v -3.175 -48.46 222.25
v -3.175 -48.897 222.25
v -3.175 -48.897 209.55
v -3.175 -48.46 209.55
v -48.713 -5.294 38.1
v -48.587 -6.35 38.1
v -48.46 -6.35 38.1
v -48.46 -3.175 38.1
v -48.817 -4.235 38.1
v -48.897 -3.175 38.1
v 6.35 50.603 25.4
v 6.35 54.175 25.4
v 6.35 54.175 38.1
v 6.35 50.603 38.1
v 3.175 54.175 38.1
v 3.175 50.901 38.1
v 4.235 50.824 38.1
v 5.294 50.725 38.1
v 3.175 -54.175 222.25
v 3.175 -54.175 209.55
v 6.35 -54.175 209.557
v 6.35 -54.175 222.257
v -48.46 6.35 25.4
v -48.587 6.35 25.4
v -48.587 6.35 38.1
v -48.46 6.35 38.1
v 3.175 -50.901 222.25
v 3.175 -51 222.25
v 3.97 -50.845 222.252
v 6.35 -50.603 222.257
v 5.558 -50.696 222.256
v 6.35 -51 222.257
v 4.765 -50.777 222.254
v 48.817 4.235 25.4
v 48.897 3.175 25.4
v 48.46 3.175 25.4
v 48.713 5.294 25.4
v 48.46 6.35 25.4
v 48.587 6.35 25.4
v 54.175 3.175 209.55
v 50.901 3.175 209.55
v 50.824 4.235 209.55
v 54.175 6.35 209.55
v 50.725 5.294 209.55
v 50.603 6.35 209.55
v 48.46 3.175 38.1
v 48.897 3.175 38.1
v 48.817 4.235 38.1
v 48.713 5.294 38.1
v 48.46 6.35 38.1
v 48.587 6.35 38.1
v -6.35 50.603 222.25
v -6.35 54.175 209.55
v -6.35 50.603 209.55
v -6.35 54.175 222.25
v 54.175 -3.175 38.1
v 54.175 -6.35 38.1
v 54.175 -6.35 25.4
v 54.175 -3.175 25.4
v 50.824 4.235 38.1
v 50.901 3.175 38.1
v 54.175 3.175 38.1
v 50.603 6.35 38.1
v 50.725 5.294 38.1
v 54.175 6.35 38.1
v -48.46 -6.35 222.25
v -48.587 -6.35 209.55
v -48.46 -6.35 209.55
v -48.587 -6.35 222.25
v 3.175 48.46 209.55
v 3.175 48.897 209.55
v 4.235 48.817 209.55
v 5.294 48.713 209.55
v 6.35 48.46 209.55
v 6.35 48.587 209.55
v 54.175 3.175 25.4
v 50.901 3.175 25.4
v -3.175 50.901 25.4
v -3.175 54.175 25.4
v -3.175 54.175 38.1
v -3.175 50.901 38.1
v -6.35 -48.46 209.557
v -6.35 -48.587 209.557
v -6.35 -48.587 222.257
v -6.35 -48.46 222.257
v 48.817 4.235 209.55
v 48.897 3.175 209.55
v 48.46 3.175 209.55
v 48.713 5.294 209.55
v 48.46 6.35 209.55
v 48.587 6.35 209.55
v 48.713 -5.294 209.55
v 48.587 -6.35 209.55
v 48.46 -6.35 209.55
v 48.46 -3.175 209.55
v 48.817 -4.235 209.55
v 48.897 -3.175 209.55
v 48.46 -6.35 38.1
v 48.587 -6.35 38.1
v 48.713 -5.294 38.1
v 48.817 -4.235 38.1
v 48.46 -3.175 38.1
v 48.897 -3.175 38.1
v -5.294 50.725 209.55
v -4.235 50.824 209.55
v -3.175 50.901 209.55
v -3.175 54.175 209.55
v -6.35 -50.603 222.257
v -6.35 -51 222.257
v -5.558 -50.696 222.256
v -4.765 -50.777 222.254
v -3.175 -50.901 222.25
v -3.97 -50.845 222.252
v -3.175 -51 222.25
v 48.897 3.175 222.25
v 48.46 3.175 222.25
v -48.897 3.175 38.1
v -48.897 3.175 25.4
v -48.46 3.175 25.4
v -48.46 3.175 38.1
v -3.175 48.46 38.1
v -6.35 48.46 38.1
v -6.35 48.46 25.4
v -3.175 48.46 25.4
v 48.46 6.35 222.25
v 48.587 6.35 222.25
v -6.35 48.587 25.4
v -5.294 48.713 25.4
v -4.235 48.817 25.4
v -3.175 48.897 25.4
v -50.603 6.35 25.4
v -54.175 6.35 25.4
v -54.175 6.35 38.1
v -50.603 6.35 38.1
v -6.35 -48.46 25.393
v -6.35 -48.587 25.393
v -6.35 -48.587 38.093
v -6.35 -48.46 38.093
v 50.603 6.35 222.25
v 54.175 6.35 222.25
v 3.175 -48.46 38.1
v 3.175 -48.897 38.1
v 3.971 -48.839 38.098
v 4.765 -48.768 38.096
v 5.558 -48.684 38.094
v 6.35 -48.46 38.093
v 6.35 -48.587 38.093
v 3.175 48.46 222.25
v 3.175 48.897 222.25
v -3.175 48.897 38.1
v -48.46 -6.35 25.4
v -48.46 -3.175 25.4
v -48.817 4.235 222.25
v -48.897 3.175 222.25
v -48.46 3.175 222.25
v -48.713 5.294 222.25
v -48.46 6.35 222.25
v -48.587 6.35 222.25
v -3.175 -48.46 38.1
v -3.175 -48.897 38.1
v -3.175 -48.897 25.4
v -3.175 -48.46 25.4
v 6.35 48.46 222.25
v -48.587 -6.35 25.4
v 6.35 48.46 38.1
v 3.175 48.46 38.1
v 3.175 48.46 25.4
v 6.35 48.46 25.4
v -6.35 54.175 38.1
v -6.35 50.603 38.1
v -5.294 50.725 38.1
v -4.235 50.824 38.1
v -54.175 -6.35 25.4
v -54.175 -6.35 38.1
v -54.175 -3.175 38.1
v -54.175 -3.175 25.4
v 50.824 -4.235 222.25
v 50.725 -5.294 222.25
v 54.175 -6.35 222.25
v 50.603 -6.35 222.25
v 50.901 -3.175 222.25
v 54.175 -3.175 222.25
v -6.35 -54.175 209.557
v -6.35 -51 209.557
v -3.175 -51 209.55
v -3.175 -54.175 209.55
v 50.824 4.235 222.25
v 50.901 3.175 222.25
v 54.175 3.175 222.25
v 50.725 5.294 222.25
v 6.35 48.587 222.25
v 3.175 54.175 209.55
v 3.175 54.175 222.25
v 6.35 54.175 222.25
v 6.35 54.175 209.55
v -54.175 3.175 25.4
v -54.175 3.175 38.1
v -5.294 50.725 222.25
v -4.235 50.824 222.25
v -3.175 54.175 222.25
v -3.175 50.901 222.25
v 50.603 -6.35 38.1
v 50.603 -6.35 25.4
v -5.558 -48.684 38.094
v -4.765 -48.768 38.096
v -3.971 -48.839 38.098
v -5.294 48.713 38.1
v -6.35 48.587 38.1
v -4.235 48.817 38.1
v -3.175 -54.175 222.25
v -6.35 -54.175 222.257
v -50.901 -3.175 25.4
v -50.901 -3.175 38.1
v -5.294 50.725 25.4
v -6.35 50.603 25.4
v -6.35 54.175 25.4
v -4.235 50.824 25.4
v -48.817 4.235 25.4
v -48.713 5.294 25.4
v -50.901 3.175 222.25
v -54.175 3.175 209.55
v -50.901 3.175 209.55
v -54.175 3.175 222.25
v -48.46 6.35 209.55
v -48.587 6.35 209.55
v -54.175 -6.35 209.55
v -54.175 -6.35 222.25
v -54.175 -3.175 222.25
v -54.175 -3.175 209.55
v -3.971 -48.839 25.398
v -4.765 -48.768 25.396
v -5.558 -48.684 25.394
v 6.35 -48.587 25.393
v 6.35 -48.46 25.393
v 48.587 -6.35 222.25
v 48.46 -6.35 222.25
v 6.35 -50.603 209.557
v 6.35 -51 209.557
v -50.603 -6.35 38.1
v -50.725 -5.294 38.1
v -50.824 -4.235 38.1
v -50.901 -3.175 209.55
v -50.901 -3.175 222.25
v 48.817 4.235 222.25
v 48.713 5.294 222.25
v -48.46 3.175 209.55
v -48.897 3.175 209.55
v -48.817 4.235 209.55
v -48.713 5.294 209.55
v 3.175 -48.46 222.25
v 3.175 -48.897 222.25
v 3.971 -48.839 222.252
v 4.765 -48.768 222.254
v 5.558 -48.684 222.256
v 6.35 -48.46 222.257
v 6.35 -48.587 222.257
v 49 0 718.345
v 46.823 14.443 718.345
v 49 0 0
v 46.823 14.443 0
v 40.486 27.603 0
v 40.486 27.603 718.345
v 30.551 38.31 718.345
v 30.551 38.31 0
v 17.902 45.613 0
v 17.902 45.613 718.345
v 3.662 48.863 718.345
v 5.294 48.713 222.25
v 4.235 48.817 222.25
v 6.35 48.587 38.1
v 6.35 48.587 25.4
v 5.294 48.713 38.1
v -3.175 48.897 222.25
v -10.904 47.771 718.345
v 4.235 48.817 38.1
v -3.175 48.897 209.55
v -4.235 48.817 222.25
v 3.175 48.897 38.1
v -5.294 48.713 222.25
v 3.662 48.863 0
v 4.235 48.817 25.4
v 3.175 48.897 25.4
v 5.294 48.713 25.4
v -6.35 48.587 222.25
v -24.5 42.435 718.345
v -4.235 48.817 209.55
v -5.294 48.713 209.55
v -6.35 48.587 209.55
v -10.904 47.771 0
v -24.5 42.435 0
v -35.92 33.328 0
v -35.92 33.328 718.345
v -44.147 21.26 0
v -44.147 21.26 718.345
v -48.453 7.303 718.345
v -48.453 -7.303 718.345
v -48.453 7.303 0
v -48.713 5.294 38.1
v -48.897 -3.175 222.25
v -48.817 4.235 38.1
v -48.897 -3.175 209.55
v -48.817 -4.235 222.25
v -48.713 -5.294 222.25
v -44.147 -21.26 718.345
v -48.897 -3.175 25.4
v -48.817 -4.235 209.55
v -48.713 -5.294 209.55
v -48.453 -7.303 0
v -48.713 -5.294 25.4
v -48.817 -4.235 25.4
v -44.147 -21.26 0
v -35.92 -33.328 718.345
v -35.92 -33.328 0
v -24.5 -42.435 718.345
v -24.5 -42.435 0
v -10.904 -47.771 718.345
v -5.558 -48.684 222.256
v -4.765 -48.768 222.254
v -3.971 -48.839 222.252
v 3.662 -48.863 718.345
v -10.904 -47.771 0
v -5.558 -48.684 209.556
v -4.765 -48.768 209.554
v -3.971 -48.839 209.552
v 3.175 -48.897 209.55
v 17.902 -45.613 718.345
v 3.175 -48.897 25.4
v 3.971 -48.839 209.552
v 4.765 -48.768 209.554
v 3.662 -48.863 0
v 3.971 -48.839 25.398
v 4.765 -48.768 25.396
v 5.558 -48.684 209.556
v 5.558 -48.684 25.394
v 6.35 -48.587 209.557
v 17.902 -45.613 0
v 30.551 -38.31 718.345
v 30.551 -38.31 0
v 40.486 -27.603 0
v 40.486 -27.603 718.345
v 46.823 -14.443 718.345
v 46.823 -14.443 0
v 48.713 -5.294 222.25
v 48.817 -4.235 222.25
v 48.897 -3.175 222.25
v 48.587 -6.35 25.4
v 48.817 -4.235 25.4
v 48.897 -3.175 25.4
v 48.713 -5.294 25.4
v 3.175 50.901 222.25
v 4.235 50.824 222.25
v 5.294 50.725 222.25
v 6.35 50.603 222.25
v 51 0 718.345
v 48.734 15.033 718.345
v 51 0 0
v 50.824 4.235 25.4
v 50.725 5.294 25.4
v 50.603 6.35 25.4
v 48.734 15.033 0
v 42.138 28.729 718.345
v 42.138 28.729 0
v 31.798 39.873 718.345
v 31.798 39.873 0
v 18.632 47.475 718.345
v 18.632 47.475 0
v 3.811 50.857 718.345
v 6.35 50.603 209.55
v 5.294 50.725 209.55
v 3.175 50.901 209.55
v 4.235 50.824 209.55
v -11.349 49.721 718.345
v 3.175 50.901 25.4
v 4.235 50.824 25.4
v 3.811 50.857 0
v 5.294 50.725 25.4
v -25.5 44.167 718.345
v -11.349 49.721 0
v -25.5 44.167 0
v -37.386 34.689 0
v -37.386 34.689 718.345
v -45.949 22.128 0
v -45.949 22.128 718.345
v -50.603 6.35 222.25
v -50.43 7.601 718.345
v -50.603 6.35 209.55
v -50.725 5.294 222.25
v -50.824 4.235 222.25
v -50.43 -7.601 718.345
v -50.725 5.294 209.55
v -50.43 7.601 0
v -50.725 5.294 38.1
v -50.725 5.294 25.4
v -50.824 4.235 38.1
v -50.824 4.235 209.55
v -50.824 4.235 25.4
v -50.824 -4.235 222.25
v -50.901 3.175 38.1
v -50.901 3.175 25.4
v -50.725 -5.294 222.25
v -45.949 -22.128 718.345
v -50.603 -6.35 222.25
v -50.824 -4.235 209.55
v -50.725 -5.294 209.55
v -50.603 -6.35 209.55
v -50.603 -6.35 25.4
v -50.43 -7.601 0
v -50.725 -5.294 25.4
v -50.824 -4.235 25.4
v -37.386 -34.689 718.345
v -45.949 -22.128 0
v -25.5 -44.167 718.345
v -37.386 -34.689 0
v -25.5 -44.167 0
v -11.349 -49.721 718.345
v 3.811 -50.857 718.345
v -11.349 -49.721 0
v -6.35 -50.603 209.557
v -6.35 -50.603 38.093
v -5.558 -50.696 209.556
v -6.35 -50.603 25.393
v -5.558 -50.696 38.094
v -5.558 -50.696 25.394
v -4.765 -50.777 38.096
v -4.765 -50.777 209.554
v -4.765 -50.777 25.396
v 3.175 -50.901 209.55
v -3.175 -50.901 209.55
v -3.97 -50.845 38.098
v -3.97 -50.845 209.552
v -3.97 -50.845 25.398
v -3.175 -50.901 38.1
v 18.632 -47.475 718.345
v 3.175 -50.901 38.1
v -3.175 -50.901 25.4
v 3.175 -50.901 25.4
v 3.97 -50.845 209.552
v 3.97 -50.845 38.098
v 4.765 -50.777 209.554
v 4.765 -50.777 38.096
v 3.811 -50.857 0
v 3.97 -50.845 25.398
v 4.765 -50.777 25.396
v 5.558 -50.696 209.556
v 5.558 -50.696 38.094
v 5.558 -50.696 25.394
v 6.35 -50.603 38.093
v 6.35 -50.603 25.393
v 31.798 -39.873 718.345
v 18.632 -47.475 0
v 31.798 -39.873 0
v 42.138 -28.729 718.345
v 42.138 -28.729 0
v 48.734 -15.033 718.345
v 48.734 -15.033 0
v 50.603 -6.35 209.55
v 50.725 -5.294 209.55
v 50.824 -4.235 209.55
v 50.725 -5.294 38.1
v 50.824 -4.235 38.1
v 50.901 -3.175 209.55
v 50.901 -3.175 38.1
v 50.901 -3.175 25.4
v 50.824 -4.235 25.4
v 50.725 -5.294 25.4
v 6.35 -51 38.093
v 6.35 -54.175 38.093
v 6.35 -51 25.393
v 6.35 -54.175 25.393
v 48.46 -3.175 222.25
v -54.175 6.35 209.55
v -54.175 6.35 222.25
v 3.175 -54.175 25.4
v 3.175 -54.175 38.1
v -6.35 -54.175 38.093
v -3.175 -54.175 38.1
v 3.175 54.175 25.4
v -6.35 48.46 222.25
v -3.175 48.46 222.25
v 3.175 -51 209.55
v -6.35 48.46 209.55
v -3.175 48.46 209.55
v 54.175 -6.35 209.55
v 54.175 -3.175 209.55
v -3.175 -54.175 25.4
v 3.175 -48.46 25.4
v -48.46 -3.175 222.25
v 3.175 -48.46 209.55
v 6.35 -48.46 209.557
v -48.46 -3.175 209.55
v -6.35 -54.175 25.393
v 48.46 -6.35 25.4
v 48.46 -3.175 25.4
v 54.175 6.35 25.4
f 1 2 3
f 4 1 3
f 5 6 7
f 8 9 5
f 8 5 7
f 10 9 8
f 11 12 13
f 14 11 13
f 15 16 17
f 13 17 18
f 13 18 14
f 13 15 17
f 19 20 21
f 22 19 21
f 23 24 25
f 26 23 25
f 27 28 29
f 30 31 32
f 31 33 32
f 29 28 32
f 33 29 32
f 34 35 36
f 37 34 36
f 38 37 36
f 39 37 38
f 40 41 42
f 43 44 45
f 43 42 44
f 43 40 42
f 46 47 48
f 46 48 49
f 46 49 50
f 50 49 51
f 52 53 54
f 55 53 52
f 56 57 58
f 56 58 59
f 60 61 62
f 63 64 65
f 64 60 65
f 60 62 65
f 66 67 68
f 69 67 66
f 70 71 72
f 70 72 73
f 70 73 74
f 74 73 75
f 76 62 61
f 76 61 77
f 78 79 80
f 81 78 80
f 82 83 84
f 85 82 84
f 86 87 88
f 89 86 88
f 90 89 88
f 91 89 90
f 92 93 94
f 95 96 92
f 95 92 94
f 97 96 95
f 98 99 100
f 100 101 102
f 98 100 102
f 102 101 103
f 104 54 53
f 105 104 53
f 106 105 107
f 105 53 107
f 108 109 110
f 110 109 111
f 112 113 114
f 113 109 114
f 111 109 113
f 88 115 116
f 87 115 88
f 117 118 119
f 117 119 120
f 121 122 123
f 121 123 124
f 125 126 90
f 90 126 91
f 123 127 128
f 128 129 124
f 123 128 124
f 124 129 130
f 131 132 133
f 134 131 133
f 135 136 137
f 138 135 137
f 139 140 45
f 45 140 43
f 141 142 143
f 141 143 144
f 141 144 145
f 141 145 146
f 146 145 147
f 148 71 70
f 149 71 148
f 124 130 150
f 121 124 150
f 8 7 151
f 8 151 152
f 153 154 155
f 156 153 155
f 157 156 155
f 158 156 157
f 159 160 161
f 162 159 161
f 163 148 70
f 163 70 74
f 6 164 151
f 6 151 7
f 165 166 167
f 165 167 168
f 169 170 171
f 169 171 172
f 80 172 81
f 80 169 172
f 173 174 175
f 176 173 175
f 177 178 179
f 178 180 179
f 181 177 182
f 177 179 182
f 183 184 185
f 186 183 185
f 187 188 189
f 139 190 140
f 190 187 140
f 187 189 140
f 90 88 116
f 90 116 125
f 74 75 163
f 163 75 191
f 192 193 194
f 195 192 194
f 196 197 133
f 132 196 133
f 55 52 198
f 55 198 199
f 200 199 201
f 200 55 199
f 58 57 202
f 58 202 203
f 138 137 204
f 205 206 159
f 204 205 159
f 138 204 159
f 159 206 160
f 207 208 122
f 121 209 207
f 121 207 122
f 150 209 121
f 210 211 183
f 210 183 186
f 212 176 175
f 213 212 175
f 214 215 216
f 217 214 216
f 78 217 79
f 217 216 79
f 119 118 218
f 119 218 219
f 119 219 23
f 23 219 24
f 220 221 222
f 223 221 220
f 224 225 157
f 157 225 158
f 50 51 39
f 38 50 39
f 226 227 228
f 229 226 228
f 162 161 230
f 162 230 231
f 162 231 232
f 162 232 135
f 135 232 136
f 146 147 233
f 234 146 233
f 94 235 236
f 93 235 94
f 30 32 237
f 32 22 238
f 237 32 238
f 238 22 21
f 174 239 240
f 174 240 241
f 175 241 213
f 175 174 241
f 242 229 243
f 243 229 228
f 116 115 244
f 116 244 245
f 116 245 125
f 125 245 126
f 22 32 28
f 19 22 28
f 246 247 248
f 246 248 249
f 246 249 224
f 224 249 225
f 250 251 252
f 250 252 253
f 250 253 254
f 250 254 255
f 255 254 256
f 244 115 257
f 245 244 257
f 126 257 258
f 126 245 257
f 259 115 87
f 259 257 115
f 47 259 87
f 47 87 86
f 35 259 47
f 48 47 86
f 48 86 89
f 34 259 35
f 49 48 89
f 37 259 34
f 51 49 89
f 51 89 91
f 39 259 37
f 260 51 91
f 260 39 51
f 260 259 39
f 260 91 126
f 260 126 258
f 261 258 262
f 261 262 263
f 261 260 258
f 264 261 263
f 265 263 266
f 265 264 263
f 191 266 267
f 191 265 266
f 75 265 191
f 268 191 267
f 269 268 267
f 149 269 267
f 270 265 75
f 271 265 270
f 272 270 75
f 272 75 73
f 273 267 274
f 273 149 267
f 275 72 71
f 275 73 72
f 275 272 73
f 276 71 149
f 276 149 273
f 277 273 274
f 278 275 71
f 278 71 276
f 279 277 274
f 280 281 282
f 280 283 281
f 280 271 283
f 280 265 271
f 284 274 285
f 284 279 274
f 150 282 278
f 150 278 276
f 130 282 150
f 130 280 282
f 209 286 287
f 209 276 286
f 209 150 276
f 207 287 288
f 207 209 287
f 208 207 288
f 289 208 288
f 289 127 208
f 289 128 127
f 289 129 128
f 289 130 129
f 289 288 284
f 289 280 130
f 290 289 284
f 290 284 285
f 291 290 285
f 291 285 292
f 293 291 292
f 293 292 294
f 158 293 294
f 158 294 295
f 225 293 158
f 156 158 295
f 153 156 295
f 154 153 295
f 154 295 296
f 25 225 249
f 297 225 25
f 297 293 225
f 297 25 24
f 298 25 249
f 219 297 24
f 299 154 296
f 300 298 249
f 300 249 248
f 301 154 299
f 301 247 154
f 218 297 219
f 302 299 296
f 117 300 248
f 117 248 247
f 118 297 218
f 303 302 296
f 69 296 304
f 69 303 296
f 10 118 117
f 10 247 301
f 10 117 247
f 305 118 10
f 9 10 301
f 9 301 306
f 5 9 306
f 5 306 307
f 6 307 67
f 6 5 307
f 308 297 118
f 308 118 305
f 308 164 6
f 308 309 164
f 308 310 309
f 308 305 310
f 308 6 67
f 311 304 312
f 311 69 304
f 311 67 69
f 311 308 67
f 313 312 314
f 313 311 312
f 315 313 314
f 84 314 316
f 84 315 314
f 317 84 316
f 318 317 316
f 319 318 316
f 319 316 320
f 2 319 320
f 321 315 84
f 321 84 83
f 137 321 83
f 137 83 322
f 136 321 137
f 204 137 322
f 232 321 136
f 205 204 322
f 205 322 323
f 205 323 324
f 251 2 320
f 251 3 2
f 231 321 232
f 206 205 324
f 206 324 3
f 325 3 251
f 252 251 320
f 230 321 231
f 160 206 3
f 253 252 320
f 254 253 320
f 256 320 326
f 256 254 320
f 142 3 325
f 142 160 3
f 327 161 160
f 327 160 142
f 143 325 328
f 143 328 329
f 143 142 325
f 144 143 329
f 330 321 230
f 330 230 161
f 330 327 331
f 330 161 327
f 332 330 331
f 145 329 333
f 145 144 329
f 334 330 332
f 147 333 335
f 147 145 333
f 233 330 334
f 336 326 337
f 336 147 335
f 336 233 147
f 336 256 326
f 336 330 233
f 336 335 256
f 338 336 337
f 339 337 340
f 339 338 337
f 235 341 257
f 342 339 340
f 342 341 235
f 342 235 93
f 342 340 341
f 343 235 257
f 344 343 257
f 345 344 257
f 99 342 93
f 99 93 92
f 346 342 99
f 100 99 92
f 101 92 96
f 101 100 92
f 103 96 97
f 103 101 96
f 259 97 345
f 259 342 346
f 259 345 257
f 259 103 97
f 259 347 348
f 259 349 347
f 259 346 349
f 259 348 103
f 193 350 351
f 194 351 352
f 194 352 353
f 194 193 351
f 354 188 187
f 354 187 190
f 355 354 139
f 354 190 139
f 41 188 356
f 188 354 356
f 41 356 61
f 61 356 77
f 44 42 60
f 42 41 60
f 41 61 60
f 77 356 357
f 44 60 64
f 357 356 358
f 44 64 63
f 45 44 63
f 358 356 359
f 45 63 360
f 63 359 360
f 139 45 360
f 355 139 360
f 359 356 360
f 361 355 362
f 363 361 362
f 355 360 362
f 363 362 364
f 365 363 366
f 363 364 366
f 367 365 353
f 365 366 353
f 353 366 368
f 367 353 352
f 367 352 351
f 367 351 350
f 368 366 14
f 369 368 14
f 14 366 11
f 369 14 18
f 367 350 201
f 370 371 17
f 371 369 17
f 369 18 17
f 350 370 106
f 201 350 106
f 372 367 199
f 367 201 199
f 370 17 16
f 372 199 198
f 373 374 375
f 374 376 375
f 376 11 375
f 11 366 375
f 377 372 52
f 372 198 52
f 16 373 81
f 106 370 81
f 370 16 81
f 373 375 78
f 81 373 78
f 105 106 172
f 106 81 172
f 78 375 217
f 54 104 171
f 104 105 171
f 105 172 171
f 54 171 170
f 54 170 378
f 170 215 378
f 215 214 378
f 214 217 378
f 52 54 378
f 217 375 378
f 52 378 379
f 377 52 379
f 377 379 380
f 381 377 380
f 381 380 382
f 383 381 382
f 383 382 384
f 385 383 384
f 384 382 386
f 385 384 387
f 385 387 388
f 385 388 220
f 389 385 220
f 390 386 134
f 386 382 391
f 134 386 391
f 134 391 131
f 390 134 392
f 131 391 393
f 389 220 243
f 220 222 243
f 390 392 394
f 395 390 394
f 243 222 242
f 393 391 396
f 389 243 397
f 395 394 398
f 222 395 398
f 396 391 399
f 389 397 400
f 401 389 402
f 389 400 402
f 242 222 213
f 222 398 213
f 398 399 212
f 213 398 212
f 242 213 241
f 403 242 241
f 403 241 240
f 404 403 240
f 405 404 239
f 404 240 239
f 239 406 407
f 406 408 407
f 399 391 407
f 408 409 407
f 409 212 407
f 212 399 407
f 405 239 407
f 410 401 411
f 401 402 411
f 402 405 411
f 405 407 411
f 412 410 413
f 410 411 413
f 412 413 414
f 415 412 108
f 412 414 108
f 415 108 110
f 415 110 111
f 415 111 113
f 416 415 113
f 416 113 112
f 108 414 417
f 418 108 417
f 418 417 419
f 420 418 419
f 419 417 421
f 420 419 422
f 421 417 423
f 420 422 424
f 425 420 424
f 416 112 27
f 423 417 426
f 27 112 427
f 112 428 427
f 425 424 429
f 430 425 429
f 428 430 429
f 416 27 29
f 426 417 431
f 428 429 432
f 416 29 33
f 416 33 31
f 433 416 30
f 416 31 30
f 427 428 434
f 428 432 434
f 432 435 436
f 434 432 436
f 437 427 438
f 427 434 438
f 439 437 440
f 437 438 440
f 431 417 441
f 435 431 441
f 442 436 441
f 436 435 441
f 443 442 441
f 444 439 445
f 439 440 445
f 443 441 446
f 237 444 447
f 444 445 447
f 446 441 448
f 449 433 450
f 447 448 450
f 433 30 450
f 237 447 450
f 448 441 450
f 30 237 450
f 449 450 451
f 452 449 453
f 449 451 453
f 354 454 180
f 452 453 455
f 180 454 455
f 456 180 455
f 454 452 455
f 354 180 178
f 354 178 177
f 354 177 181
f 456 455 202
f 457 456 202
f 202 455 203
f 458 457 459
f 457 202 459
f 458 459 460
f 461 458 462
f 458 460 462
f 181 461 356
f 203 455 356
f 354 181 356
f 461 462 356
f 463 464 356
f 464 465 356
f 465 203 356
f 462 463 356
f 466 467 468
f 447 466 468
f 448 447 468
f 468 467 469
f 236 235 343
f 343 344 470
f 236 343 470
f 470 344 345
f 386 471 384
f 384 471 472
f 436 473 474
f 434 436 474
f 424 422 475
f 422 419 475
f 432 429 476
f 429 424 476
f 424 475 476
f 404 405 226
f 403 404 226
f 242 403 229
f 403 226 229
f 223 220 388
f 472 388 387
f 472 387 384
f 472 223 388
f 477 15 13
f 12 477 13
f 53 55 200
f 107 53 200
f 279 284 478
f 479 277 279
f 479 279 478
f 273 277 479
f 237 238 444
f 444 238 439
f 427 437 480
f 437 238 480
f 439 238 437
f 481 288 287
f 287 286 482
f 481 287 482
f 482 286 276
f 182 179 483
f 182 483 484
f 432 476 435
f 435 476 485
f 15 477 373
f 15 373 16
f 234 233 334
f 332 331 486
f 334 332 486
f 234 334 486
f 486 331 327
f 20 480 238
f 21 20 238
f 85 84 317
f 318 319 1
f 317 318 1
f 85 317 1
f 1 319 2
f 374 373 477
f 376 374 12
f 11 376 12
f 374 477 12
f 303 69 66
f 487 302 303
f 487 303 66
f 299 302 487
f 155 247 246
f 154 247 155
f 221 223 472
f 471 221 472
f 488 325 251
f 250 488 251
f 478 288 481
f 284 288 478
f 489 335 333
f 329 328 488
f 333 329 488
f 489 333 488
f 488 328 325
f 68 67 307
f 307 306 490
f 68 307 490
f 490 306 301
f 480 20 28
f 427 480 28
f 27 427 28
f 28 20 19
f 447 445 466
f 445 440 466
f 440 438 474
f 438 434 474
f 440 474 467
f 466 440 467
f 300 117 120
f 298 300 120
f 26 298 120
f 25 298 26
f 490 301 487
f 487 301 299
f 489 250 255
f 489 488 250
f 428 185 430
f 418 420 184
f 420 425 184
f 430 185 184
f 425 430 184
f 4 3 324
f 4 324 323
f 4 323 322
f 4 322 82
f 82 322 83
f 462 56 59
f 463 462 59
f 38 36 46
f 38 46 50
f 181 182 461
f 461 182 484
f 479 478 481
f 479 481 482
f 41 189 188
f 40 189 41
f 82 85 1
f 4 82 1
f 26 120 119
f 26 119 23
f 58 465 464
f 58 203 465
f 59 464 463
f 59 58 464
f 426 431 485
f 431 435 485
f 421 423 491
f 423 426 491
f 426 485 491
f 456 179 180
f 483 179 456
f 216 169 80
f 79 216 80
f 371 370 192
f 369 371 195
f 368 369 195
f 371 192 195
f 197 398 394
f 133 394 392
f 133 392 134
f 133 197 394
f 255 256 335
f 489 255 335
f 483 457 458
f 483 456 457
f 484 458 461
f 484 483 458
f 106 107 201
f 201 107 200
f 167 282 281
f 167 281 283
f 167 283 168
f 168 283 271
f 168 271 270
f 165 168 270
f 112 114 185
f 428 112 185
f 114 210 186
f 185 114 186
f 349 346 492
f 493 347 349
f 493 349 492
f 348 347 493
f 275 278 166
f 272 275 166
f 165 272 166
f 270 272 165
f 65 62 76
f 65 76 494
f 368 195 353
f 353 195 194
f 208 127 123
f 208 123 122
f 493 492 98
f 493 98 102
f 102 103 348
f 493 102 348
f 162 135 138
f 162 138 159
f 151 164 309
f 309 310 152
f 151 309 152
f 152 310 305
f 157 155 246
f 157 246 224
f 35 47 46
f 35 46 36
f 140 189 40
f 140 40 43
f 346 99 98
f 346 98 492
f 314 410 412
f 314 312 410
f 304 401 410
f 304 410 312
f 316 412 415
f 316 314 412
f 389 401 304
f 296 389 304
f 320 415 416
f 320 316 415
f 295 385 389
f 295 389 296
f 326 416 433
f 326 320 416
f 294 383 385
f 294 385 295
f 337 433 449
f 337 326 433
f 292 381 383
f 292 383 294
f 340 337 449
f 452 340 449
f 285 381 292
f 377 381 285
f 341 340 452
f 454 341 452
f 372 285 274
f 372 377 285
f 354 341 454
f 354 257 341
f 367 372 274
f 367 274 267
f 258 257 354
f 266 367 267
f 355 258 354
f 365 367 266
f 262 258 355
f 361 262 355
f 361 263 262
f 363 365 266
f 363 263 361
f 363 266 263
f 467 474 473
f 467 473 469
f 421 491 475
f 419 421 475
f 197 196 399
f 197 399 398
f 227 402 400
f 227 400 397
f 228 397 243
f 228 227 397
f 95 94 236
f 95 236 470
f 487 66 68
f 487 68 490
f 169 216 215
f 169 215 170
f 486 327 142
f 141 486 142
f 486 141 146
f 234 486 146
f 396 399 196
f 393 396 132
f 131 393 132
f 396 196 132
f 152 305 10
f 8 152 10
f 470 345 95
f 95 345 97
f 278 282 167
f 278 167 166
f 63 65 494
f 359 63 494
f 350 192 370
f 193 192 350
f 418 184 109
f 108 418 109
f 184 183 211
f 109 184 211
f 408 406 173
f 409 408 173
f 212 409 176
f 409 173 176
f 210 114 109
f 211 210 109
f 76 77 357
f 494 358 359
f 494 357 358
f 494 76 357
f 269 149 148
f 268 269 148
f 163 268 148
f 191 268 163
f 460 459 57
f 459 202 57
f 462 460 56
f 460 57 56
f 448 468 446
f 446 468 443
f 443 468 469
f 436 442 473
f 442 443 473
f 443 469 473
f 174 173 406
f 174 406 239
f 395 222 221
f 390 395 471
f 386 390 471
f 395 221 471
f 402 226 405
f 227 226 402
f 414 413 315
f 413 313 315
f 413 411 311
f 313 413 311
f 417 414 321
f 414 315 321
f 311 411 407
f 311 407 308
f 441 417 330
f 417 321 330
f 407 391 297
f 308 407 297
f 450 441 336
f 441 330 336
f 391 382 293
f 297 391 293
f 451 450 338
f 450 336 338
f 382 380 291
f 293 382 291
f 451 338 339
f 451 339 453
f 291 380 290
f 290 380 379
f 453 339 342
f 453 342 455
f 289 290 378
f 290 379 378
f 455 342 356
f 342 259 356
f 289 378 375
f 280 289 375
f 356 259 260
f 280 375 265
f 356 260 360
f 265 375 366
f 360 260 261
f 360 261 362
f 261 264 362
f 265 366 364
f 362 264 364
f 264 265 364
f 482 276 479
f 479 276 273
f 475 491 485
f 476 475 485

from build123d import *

# Parameters (mm, degrees)
F0_R       = 51
F0_R_2     = 49
F1_DEPTH   = 718.34502
F5_DEPTH   = 3.175
F7_W       = 3.175
F7_H       = 12.7
F8_DEPTH   = 3.175
F10_W      = 3.175
F10_H      = 12.7
F11_DEPTH  = 3.175
F13_W      = 3.175
F13_H      = 12.7
F14_DEPTH  = 3.175
F15_DEPTH  = 2.54
F8_FACE_W  = 3.175
F8_FACE_H  = 12.7
F16_DEPTH  = 2.54
F11_FACE_W = 3.175
F11_FACE_H = 12.7
F17_DEPTH  = 2.54
F14_FACE_W = 3.175
F14_FACE_H = 12.7
F18_DEPTH  = 2.54


with BuildPart() as f1:
    # F0 (on Top) → F1 (new body)
    with BuildSketch(Plane.XY):
        Circle(F0_R)
        Circle(F0_R_2, mode=Mode.SUBTRACT)
    extrude(amount=F1_DEPTH)



with BuildPart() as f5:
    # F4 (on line) → F5 (new body)
    with BuildSketch(Plane.XZ.offset(51)):
        Polygon((-3.175, 209.55), (-3.175, 222.25), (-6.3499914317, 222.2573762128), (-6.3499914317, 209.5573762128), align=None)
    extrude(amount=F5_DEPTH)


with BuildPart() as f5b:
    # F4 (on line) → F5, piece 2 (new body)
    with BuildSketch(Plane.XZ.offset(51)):
        Polygon((6.3499914317, 222.2573762128), (3.175, 222.25), (3.175, 209.55), (6.3499914317, 209.5573762128), align=None)
    extrude(amount=F5_DEPTH)


with BuildPart() as f5c:
    # F4 (on line) → F5, piece 3 (new body)
    with BuildSketch(Plane.XZ.offset(51)):
        Polygon((3.175, 38.1), (3.175, 25.4), (6.3499914317, 25.3926237872), (6.3499914317, 38.0926237872), align=None)
    extrude(amount=F5_DEPTH)


with BuildPart() as f5d:
    # F4 (on line) → F5, piece 4 (new body)
    with BuildSketch(Plane.XZ.offset(51)):
        Polygon((-6.3499914317, 25.3926237872), (-3.175, 25.4), (-3.175, 38.1), (-6.3499914317, 38.0926237872), align=None)
    extrude(amount=F5_DEPTH)


with BuildPart() as f8:
    # F7 (on line) → F8 (new body)
    with BuildSketch(Plane.YZ.offset(51)):
        with Locations((-4.7625, 215.9)):
            Rectangle(F7_W, F7_H)
    extrude(amount=F8_DEPTH)


with BuildPart() as f8b:
    # F7 (on line) → F8, piece 2 (new body)
    with BuildSketch(Plane.YZ.offset(51)):
        with Locations((4.7625, 215.9)):
            Rectangle(F7_W, F7_H)
    extrude(amount=F8_DEPTH)


with BuildPart() as f8c:
    # F7 (on line) → F8, piece 3 (new body)
    with BuildSketch(Plane.YZ.offset(51)):
        with Locations((4.7625, 31.75)):
            Rectangle(F7_W, F7_H)
    extrude(amount=F8_DEPTH)


with BuildPart() as f8d:
    # F7 (on line) → F8, piece 4 (new body)
    with BuildSketch(Plane.YZ.offset(51)):
        with Locations((-4.7625, 31.75)):
            Rectangle(F7_W, F7_H)
    extrude(amount=F8_DEPTH)


with BuildPart() as f11:
    # F10 (on line) → F11 (new body)
    with BuildSketch(Plane.XZ.offset(-51)):
        with Locations((-4.7625, 215.9)):
            Rectangle(F10_W, F10_H)
    extrude(amount=-F11_DEPTH)


with BuildPart() as f11b:
    # F10 (on line) → F11, piece 2 (new body)
    with BuildSketch(Plane.XZ.offset(-51)):
        with Locations((4.7625, 215.9)):
            Rectangle(F10_W, F10_H)
    extrude(amount=-F11_DEPTH)


with BuildPart() as f11c:
    # F10 (on line) → F11, piece 3 (new body)
    with BuildSketch(Plane.XZ.offset(-51)):
        with Locations((-4.7625, 31.75)):
            Rectangle(F10_W, F10_H)
    extrude(amount=-F11_DEPTH)


with BuildPart() as f11d:
    # F10 (on line) → F11, piece 4 (new body)
    with BuildSketch(Plane.XZ.offset(-51)):
        with Locations((4.7625, 31.75)):
            Rectangle(F10_W, F10_H)
    extrude(amount=-F11_DEPTH)


with BuildPart() as f14:
    # F13 (on line) → F14 (new body)
    with BuildSketch(Plane.YZ.offset(-51)):
        with Locations((-4.7625, 215.9)):
            Rectangle(F13_W, F13_H)
    extrude(amount=-F14_DEPTH)


with BuildPart() as f14b:
    # F13 (on line) → F14, piece 2 (new body)
    with BuildSketch(Plane.YZ.offset(-51)):
        with Locations((4.7625, 215.9)):
            Rectangle(F13_W, F13_H)
    extrude(amount=-F14_DEPTH)


with BuildPart() as f14c:
    # F13 (on line) → F14, piece 3 (new body)
    with BuildSketch(Plane.YZ.offset(-51)):
        with Locations((-4.7625, 31.75)):
            Rectangle(F13_W, F13_H)
    extrude(amount=-F14_DEPTH)


with BuildPart() as f14d:
    # F13 (on line) → F14, piece 4 (new body)
    with BuildSketch(Plane.YZ.offset(-51)):
        with Locations((4.7625, 31.75)):
            Rectangle(F13_W, F13_H)
    extrude(amount=-F14_DEPTH)


with BuildPart() as f1_1:
    add(f1.part)

    add(f5.part)  # F15 merges F5

    add(f5b.part)  # F15 merges F5b

    add(f5c.part)  # F15 merges F5c

    add(f5d.part)  # F15 merges F5d
    # F5_face (on face) → F15 (join)
    with BuildSketch(Plane(origin=(4.7624957159, -51, 31.7463118936), x_dir=(1, 0, 0), z_dir=(0, 1, 0))):
        Polygon((-1.5874957159, -6.3536881064), (1.5874957159, -6.3463118936), (1.5874957159, 6.3536881064), (-1.5874957159, 6.3463118936), align=None)
        Polygon((-11.1124871476, 6.3536881064), (-11.1124871476, -6.3463118936), (-7.9374957159, -6.3536881064), (-7.9374957159, 6.3463118936), align=None)
        Polygon((-1.5874957159, -190.5036881064), (1.5874957159, -190.5110643193), (1.5874957159, -177.8110643193), (-1.5874957159, -177.8036881064), align=None)
        Polygon((-7.9374957159, -190.5036881064), (-7.9374957159, -177.8036881064), (-11.1124871476, -177.8110643193), (-11.1124871476, -190.5110643193), align=None)
    extrude(amount=F15_DEPTH)


    add(f8.part)  # F16 merges F8

    add(f8b.part)  # F16 merges F8b

    add(f8c.part)  # F16 merges F8c

    add(f8d.part)  # F16 merges F8d
    # F8_face (on face) → F16 (join)
    with BuildSketch(Plane(origin=(51, 4.7625, 215.9), x_dir=(0, 1, 0), z_dir=(-1, 0, 0))):
        Rectangle(F8_FACE_W, F8_FACE_H)
        with Locations((-9.525, 0)):
            Rectangle(F8_FACE_W, F8_FACE_H)
        with Locations((-9.525, 184.15)):
            Rectangle(F8_FACE_W, F8_FACE_H)
        with Locations((0, 184.15)):
            Rectangle(F8_FACE_W, F8_FACE_H)
    extrude(amount=F16_DEPTH)


    add(f11.part)  # F17 merges F11

    add(f11b.part)  # F17 merges F11b

    add(f11c.part)  # F17 merges F11c

    add(f11d.part)  # F17 merges F11d
    # F11_face (on face) → F17 (join)
    with BuildSketch(Plane(origin=(4.7625, 51, 215.9), x_dir=(1, 0, 0), z_dir=(0, -1, 0))):
        Rectangle(F11_FACE_W, F11_FACE_H)
        with Locations((-9.525, 0)):
            Rectangle(F11_FACE_W, F11_FACE_H)
        with Locations((-9.525, -184.15)):
            Rectangle(F11_FACE_W, F11_FACE_H)
        with Locations((0, -184.15)):
            Rectangle(F11_FACE_W, F11_FACE_H)
    extrude(amount=F17_DEPTH)


    add(f14.part)  # F18 merges F14

    add(f14b.part)  # F18 merges F14b

    add(f14c.part)  # F18 merges F14c

    add(f14d.part)  # F18 merges F14d
    # F14_face (on face) → F18 (join)
    with BuildSketch(Plane(origin=(-51, -4.7625, 215.9), x_dir=(0, 1, 0), z_dir=(1, 0, 0))):
        Rectangle(F14_FACE_W, F14_FACE_H)
        with Locations((9.525, 0)):
            Rectangle(F14_FACE_W, F14_FACE_H)
        with Locations((0, -184.15)):
            Rectangle(F14_FACE_W, F14_FACE_H)
        with Locations((9.525, -184.15)):
            Rectangle(F14_FACE_W, F14_FACE_H)
    extrude(amount=F18_DEPTH)


solid = f1_1.part
